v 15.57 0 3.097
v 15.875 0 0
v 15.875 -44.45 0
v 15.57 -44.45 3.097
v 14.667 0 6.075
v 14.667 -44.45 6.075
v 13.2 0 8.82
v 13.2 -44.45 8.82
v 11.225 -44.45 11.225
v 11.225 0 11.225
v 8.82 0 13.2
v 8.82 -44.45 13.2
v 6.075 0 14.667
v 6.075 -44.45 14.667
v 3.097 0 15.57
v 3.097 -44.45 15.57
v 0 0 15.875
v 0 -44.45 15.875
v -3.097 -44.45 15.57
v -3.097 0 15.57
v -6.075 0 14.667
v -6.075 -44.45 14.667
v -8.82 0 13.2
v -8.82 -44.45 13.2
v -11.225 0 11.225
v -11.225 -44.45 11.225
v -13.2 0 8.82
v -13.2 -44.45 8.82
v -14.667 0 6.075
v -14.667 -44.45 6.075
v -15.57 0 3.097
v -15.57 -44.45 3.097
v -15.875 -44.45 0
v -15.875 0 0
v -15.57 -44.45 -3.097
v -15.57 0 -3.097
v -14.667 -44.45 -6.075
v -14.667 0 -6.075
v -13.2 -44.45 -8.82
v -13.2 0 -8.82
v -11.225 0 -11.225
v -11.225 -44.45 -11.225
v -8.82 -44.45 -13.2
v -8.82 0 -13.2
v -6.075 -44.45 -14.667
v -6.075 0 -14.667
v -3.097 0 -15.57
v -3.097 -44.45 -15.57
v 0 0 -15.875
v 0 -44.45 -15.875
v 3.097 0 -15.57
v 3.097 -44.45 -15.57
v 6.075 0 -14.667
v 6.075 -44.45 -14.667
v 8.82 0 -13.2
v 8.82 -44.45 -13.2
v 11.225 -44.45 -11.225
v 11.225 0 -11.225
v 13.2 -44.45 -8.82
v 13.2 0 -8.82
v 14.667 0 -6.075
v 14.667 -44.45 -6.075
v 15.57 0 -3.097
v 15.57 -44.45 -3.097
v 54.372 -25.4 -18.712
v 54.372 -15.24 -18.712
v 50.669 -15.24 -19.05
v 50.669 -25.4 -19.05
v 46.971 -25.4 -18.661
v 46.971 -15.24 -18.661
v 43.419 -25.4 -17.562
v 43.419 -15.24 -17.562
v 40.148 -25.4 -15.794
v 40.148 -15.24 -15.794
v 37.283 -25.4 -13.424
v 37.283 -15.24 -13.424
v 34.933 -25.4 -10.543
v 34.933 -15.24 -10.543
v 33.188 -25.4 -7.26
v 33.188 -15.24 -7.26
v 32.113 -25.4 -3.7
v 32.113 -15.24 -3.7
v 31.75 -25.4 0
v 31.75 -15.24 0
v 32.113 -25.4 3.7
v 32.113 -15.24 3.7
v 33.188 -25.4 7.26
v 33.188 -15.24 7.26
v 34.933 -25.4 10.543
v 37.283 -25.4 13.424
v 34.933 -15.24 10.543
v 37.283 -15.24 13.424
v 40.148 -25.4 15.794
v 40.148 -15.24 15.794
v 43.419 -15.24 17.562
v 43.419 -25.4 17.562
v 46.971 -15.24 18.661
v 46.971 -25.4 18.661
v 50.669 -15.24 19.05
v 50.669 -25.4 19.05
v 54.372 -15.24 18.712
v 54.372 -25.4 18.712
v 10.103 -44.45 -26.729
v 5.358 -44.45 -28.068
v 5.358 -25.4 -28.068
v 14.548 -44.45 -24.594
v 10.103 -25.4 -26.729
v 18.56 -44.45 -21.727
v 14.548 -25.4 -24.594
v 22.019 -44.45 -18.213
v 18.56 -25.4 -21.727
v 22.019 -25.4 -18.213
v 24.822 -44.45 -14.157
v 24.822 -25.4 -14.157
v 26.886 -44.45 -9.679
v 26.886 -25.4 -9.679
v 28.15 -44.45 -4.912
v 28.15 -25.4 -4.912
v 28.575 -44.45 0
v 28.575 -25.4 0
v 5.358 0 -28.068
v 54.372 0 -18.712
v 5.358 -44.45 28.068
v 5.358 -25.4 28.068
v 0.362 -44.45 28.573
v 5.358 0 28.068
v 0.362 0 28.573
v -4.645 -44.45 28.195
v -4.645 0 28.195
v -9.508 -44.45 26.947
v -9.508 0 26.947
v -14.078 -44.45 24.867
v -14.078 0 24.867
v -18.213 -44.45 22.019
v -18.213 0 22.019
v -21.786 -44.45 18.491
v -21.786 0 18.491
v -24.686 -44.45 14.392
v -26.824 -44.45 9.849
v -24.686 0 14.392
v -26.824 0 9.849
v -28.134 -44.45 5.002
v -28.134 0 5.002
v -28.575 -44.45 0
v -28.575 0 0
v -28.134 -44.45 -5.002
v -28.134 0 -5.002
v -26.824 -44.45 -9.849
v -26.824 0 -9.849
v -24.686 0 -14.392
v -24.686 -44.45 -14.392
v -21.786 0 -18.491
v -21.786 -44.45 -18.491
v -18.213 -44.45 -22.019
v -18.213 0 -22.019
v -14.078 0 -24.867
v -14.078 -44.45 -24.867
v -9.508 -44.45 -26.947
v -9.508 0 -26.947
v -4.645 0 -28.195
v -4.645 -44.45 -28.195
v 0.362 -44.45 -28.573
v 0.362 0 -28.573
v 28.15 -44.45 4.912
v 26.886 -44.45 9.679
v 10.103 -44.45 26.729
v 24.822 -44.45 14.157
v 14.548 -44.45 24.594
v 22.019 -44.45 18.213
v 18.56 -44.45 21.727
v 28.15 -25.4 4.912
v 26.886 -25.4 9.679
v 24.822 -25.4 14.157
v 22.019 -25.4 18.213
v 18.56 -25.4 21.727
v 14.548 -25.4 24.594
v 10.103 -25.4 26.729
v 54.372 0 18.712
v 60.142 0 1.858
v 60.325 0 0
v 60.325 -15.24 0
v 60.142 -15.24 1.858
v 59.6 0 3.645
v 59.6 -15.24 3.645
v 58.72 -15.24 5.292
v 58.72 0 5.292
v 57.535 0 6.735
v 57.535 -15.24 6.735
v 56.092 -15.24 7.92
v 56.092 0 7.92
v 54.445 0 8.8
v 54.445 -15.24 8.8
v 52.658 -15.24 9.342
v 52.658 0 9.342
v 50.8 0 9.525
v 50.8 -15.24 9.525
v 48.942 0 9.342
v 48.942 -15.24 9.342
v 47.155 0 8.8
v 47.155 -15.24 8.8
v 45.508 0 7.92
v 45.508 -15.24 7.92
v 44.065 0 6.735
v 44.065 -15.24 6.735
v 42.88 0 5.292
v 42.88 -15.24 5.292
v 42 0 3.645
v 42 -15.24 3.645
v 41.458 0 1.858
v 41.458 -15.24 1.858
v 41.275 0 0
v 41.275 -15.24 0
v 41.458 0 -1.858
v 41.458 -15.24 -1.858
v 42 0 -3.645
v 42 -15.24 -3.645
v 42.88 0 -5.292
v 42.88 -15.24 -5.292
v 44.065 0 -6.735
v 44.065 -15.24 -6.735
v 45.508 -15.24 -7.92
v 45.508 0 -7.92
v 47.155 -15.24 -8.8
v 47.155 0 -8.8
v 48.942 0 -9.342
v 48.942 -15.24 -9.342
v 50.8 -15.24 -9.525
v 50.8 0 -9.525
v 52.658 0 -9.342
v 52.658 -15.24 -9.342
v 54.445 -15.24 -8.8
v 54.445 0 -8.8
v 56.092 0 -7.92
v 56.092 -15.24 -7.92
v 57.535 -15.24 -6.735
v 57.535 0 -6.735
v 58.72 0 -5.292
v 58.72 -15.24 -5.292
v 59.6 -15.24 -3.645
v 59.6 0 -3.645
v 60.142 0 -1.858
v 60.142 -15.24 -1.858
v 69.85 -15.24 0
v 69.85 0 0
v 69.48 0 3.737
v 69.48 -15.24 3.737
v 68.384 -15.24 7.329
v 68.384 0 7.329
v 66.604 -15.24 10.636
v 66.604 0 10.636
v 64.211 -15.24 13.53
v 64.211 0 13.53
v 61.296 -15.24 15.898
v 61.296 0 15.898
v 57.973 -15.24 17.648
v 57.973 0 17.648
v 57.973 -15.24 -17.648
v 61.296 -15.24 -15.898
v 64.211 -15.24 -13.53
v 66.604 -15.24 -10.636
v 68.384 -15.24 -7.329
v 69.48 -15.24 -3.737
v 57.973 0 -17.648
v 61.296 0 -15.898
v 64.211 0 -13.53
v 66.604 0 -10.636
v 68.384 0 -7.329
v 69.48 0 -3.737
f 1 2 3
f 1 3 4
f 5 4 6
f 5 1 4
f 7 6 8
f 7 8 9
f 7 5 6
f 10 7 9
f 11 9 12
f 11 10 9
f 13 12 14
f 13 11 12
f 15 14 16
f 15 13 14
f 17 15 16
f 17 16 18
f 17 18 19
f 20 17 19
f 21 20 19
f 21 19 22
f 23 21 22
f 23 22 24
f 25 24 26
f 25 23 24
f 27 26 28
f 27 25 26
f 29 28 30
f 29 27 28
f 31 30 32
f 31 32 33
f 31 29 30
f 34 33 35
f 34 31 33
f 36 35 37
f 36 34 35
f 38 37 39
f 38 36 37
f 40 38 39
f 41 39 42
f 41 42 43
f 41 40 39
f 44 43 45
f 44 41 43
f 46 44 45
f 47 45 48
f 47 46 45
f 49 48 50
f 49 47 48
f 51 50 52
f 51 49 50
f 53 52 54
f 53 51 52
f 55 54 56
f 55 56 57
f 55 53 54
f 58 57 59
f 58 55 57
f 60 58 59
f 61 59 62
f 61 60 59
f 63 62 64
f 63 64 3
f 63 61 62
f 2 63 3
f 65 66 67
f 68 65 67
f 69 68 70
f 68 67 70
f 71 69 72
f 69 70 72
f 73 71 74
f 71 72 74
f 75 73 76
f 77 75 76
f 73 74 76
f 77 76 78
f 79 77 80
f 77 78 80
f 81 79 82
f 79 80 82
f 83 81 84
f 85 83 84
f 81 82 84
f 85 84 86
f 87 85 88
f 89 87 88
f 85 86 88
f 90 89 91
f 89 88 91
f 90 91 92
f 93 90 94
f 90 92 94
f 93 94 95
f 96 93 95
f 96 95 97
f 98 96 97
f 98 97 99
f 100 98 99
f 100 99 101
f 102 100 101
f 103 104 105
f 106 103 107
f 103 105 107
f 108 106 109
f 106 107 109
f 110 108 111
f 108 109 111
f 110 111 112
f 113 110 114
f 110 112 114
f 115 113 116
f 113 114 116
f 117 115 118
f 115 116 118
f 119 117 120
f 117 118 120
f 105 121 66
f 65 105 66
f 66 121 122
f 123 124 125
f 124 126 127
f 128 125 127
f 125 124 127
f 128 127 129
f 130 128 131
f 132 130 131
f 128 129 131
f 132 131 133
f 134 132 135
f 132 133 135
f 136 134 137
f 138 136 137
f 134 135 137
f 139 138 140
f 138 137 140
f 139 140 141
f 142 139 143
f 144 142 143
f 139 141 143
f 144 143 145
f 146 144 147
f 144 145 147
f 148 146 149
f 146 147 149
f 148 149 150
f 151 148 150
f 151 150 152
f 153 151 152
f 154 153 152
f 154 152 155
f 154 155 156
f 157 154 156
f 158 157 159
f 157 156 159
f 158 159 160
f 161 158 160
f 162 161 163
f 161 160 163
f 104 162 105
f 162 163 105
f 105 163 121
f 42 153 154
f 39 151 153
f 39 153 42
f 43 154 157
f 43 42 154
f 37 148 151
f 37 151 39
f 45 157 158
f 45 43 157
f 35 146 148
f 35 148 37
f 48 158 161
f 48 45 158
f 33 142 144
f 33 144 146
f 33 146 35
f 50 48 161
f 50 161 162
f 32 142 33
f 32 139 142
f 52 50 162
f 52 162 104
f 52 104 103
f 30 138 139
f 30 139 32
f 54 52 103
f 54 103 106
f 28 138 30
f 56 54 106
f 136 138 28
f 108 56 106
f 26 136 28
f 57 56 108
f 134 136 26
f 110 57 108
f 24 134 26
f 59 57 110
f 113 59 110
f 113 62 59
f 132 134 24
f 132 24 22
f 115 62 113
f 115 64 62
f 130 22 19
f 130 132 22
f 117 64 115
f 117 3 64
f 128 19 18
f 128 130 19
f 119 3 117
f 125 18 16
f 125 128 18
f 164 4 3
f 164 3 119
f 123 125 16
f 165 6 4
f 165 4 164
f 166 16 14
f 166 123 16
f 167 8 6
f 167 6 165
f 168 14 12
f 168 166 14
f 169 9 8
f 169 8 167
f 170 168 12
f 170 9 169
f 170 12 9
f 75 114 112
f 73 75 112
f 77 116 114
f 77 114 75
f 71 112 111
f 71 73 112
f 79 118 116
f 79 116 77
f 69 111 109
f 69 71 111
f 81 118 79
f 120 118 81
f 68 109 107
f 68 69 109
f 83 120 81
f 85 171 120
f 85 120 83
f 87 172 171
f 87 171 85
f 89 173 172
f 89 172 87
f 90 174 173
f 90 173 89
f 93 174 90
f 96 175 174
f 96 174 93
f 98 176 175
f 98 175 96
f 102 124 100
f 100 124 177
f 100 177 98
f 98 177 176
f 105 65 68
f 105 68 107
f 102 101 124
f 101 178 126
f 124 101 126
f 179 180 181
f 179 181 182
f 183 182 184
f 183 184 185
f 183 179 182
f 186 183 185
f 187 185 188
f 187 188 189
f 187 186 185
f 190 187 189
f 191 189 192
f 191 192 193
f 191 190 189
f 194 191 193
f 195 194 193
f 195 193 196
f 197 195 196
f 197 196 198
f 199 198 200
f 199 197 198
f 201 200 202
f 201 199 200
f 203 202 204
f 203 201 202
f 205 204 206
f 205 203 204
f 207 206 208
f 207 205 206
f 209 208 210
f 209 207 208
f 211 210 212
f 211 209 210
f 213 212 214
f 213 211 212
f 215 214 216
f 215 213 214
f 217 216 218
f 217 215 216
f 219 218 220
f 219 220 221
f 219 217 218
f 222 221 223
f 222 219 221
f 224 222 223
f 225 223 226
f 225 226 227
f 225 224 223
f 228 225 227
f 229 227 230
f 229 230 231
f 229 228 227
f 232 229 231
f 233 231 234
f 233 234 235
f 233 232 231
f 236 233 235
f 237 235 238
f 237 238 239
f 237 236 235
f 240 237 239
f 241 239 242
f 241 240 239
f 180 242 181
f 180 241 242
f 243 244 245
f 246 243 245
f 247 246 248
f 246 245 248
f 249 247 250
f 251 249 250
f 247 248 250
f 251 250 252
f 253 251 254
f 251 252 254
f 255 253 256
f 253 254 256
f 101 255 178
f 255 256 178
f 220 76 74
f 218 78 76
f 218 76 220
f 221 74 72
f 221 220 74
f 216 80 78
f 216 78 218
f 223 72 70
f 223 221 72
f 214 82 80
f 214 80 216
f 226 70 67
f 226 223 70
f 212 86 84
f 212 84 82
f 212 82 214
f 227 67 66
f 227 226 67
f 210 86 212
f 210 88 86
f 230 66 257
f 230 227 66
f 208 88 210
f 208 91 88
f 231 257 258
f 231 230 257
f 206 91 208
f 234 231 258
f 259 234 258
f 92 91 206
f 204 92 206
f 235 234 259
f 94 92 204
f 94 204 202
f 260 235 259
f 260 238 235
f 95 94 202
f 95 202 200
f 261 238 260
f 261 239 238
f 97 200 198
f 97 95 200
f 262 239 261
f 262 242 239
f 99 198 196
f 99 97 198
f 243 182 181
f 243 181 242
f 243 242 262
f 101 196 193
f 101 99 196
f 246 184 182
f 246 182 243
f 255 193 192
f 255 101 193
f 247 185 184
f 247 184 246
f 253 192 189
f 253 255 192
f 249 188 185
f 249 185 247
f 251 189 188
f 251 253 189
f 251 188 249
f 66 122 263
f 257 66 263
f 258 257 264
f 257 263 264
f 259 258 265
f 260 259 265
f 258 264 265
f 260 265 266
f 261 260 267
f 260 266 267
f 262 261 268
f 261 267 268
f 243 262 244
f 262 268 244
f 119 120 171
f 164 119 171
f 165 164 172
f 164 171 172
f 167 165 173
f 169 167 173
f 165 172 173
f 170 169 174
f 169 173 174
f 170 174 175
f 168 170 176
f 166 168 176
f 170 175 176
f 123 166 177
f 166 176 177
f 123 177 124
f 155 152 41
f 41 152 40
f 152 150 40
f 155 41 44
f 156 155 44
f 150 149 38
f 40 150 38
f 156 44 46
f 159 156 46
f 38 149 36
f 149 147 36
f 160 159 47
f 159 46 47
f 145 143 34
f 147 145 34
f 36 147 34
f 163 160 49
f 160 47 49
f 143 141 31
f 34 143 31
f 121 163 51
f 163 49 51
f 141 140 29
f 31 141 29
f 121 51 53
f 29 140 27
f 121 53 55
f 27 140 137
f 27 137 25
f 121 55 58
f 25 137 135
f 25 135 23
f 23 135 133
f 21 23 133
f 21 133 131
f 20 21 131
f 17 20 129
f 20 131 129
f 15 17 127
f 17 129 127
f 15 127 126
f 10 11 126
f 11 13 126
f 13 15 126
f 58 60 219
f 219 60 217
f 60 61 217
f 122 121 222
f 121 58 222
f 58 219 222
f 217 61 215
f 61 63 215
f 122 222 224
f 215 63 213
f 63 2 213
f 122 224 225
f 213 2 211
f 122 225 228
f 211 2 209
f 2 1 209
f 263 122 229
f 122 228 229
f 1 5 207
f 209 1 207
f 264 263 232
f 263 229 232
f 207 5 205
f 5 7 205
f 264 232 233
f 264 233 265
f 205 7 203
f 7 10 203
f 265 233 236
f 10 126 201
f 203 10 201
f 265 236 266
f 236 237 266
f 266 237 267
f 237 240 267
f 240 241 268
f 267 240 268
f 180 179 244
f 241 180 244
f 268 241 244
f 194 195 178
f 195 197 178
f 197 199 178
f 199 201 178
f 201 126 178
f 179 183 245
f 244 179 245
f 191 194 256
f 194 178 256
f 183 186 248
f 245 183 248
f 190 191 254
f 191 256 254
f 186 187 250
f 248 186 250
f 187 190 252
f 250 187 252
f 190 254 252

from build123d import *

# Parameters (mm, degrees)
F0_R     = 15.875
F1_DEPTH = 44.45
F2_DEPTH = 25.4
F0_R_2   = 9.525
F3_DEPTH = 15.24


with BuildPart() as f1:
    # F0 (on Front) → F1 (new body)
    with BuildSketch(Plane.XZ):
        with BuildLine():
            ThreePointArc((28.575, 0), (22.018516, 18.21306), (5.357812, 28.068211))
            ThreePointArc((5.357812, 28.068211), (-28.575, 0), (5.357812, -28.068211))
            ThreePointArc((5.357812, -28.068211), (22.018516, -18.21306), (28.575, 0))
        make_face()
        Circle(F0_R, mode=Mode.SUBTRACT)
    extrude(amount=F1_DEPTH)

    # F0 (on Front) → F2 (join)
    with BuildSketch(Plane.XZ):
        with BuildLine():
            ThreePointArc((54.371875, -18.712141), (31.75, 0), (54.371875, 18.712141))
            Line((54.371875, 18.712141), (5.357812, 28.068211))
            ThreePointArc((5.357812, 28.068211), (22.018516, 18.21306), (28.575, 0))
            ThreePointArc((28.575, 0), (22.018516, -18.21306), (5.357812, -28.068211))
            Line((5.357812, -28.068211), (54.371875, -18.712141))
        make_face()
    extrude(amount=F2_DEPTH)

    # F0 (on Front) → F3 (join)
    with BuildSketch(Plane.XZ):
        with BuildLine():
            ThreePointArc((54.371875, -18.712141), (65.479011, -12.14204), (69.85, 0))
            ThreePointArc((69.85, 0), (65.479011, 12.14204), (54.371875, 18.712141))
            ThreePointArc((54.371875, 18.712141), (31.75, 0), (54.371875, -18.712141))
        make_face()
        with Locations((50.8, 0)):
            Circle(F0_R_2, mode=Mode.SUBTRACT)
    extrude(amount=F3_DEPTH)


solid = f1.part
